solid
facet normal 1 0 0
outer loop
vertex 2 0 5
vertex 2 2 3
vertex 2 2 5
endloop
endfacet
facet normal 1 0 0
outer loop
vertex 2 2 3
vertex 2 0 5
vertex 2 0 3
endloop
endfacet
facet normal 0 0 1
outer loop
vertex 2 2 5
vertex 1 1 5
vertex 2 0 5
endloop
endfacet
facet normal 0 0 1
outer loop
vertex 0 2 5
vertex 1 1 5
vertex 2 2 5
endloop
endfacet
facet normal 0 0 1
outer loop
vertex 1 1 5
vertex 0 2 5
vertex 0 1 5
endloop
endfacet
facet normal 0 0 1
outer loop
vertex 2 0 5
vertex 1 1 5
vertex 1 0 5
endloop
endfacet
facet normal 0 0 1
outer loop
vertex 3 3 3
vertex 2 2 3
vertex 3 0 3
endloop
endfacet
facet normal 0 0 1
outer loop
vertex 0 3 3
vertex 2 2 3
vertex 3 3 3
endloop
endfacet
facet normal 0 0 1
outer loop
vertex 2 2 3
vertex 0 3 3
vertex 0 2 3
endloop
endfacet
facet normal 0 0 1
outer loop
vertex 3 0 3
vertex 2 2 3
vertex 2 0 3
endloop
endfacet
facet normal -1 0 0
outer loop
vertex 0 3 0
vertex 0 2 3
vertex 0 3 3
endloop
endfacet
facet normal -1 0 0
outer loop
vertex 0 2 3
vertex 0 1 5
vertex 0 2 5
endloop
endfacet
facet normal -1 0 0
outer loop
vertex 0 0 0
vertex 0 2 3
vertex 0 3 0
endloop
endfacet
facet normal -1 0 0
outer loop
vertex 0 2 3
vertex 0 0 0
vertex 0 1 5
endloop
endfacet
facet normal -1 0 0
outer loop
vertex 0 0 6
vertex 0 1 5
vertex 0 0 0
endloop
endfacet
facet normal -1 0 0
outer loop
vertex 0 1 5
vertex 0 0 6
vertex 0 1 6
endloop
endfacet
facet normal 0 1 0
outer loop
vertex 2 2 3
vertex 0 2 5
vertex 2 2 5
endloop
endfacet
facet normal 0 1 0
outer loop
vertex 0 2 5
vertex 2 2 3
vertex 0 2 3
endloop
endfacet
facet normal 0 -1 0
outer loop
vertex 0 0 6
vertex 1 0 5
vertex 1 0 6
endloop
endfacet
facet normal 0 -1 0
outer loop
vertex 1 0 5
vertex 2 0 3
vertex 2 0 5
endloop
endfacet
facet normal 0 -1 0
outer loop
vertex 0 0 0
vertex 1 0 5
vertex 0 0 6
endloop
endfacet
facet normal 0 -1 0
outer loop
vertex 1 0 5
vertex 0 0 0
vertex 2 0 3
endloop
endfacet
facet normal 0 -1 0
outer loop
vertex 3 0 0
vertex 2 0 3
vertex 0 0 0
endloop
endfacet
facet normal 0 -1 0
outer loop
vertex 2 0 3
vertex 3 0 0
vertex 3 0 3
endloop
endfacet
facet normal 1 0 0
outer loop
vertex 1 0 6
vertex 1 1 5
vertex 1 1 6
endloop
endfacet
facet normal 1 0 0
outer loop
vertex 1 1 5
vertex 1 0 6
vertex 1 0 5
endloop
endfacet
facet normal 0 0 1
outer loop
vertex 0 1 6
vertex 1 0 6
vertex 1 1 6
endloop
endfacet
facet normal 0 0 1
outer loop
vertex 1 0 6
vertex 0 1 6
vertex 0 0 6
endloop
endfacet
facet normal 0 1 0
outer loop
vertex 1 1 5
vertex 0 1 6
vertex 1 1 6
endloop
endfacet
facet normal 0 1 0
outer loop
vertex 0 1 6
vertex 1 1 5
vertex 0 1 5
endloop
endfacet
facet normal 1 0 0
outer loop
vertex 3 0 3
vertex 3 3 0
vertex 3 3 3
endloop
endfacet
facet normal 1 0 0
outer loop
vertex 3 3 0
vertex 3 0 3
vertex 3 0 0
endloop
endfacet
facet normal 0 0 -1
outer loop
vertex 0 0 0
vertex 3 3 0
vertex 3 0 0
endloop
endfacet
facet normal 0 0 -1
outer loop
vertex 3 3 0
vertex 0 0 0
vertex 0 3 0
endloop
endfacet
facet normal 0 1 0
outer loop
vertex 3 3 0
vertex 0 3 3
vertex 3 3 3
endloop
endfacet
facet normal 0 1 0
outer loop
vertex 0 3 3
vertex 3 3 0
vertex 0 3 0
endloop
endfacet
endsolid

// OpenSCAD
module tree(n) {
  if (n > 0) {
    cube(n);
    translate([0, 0, n]) tree(n - 1);
  }
}
tree(3);
